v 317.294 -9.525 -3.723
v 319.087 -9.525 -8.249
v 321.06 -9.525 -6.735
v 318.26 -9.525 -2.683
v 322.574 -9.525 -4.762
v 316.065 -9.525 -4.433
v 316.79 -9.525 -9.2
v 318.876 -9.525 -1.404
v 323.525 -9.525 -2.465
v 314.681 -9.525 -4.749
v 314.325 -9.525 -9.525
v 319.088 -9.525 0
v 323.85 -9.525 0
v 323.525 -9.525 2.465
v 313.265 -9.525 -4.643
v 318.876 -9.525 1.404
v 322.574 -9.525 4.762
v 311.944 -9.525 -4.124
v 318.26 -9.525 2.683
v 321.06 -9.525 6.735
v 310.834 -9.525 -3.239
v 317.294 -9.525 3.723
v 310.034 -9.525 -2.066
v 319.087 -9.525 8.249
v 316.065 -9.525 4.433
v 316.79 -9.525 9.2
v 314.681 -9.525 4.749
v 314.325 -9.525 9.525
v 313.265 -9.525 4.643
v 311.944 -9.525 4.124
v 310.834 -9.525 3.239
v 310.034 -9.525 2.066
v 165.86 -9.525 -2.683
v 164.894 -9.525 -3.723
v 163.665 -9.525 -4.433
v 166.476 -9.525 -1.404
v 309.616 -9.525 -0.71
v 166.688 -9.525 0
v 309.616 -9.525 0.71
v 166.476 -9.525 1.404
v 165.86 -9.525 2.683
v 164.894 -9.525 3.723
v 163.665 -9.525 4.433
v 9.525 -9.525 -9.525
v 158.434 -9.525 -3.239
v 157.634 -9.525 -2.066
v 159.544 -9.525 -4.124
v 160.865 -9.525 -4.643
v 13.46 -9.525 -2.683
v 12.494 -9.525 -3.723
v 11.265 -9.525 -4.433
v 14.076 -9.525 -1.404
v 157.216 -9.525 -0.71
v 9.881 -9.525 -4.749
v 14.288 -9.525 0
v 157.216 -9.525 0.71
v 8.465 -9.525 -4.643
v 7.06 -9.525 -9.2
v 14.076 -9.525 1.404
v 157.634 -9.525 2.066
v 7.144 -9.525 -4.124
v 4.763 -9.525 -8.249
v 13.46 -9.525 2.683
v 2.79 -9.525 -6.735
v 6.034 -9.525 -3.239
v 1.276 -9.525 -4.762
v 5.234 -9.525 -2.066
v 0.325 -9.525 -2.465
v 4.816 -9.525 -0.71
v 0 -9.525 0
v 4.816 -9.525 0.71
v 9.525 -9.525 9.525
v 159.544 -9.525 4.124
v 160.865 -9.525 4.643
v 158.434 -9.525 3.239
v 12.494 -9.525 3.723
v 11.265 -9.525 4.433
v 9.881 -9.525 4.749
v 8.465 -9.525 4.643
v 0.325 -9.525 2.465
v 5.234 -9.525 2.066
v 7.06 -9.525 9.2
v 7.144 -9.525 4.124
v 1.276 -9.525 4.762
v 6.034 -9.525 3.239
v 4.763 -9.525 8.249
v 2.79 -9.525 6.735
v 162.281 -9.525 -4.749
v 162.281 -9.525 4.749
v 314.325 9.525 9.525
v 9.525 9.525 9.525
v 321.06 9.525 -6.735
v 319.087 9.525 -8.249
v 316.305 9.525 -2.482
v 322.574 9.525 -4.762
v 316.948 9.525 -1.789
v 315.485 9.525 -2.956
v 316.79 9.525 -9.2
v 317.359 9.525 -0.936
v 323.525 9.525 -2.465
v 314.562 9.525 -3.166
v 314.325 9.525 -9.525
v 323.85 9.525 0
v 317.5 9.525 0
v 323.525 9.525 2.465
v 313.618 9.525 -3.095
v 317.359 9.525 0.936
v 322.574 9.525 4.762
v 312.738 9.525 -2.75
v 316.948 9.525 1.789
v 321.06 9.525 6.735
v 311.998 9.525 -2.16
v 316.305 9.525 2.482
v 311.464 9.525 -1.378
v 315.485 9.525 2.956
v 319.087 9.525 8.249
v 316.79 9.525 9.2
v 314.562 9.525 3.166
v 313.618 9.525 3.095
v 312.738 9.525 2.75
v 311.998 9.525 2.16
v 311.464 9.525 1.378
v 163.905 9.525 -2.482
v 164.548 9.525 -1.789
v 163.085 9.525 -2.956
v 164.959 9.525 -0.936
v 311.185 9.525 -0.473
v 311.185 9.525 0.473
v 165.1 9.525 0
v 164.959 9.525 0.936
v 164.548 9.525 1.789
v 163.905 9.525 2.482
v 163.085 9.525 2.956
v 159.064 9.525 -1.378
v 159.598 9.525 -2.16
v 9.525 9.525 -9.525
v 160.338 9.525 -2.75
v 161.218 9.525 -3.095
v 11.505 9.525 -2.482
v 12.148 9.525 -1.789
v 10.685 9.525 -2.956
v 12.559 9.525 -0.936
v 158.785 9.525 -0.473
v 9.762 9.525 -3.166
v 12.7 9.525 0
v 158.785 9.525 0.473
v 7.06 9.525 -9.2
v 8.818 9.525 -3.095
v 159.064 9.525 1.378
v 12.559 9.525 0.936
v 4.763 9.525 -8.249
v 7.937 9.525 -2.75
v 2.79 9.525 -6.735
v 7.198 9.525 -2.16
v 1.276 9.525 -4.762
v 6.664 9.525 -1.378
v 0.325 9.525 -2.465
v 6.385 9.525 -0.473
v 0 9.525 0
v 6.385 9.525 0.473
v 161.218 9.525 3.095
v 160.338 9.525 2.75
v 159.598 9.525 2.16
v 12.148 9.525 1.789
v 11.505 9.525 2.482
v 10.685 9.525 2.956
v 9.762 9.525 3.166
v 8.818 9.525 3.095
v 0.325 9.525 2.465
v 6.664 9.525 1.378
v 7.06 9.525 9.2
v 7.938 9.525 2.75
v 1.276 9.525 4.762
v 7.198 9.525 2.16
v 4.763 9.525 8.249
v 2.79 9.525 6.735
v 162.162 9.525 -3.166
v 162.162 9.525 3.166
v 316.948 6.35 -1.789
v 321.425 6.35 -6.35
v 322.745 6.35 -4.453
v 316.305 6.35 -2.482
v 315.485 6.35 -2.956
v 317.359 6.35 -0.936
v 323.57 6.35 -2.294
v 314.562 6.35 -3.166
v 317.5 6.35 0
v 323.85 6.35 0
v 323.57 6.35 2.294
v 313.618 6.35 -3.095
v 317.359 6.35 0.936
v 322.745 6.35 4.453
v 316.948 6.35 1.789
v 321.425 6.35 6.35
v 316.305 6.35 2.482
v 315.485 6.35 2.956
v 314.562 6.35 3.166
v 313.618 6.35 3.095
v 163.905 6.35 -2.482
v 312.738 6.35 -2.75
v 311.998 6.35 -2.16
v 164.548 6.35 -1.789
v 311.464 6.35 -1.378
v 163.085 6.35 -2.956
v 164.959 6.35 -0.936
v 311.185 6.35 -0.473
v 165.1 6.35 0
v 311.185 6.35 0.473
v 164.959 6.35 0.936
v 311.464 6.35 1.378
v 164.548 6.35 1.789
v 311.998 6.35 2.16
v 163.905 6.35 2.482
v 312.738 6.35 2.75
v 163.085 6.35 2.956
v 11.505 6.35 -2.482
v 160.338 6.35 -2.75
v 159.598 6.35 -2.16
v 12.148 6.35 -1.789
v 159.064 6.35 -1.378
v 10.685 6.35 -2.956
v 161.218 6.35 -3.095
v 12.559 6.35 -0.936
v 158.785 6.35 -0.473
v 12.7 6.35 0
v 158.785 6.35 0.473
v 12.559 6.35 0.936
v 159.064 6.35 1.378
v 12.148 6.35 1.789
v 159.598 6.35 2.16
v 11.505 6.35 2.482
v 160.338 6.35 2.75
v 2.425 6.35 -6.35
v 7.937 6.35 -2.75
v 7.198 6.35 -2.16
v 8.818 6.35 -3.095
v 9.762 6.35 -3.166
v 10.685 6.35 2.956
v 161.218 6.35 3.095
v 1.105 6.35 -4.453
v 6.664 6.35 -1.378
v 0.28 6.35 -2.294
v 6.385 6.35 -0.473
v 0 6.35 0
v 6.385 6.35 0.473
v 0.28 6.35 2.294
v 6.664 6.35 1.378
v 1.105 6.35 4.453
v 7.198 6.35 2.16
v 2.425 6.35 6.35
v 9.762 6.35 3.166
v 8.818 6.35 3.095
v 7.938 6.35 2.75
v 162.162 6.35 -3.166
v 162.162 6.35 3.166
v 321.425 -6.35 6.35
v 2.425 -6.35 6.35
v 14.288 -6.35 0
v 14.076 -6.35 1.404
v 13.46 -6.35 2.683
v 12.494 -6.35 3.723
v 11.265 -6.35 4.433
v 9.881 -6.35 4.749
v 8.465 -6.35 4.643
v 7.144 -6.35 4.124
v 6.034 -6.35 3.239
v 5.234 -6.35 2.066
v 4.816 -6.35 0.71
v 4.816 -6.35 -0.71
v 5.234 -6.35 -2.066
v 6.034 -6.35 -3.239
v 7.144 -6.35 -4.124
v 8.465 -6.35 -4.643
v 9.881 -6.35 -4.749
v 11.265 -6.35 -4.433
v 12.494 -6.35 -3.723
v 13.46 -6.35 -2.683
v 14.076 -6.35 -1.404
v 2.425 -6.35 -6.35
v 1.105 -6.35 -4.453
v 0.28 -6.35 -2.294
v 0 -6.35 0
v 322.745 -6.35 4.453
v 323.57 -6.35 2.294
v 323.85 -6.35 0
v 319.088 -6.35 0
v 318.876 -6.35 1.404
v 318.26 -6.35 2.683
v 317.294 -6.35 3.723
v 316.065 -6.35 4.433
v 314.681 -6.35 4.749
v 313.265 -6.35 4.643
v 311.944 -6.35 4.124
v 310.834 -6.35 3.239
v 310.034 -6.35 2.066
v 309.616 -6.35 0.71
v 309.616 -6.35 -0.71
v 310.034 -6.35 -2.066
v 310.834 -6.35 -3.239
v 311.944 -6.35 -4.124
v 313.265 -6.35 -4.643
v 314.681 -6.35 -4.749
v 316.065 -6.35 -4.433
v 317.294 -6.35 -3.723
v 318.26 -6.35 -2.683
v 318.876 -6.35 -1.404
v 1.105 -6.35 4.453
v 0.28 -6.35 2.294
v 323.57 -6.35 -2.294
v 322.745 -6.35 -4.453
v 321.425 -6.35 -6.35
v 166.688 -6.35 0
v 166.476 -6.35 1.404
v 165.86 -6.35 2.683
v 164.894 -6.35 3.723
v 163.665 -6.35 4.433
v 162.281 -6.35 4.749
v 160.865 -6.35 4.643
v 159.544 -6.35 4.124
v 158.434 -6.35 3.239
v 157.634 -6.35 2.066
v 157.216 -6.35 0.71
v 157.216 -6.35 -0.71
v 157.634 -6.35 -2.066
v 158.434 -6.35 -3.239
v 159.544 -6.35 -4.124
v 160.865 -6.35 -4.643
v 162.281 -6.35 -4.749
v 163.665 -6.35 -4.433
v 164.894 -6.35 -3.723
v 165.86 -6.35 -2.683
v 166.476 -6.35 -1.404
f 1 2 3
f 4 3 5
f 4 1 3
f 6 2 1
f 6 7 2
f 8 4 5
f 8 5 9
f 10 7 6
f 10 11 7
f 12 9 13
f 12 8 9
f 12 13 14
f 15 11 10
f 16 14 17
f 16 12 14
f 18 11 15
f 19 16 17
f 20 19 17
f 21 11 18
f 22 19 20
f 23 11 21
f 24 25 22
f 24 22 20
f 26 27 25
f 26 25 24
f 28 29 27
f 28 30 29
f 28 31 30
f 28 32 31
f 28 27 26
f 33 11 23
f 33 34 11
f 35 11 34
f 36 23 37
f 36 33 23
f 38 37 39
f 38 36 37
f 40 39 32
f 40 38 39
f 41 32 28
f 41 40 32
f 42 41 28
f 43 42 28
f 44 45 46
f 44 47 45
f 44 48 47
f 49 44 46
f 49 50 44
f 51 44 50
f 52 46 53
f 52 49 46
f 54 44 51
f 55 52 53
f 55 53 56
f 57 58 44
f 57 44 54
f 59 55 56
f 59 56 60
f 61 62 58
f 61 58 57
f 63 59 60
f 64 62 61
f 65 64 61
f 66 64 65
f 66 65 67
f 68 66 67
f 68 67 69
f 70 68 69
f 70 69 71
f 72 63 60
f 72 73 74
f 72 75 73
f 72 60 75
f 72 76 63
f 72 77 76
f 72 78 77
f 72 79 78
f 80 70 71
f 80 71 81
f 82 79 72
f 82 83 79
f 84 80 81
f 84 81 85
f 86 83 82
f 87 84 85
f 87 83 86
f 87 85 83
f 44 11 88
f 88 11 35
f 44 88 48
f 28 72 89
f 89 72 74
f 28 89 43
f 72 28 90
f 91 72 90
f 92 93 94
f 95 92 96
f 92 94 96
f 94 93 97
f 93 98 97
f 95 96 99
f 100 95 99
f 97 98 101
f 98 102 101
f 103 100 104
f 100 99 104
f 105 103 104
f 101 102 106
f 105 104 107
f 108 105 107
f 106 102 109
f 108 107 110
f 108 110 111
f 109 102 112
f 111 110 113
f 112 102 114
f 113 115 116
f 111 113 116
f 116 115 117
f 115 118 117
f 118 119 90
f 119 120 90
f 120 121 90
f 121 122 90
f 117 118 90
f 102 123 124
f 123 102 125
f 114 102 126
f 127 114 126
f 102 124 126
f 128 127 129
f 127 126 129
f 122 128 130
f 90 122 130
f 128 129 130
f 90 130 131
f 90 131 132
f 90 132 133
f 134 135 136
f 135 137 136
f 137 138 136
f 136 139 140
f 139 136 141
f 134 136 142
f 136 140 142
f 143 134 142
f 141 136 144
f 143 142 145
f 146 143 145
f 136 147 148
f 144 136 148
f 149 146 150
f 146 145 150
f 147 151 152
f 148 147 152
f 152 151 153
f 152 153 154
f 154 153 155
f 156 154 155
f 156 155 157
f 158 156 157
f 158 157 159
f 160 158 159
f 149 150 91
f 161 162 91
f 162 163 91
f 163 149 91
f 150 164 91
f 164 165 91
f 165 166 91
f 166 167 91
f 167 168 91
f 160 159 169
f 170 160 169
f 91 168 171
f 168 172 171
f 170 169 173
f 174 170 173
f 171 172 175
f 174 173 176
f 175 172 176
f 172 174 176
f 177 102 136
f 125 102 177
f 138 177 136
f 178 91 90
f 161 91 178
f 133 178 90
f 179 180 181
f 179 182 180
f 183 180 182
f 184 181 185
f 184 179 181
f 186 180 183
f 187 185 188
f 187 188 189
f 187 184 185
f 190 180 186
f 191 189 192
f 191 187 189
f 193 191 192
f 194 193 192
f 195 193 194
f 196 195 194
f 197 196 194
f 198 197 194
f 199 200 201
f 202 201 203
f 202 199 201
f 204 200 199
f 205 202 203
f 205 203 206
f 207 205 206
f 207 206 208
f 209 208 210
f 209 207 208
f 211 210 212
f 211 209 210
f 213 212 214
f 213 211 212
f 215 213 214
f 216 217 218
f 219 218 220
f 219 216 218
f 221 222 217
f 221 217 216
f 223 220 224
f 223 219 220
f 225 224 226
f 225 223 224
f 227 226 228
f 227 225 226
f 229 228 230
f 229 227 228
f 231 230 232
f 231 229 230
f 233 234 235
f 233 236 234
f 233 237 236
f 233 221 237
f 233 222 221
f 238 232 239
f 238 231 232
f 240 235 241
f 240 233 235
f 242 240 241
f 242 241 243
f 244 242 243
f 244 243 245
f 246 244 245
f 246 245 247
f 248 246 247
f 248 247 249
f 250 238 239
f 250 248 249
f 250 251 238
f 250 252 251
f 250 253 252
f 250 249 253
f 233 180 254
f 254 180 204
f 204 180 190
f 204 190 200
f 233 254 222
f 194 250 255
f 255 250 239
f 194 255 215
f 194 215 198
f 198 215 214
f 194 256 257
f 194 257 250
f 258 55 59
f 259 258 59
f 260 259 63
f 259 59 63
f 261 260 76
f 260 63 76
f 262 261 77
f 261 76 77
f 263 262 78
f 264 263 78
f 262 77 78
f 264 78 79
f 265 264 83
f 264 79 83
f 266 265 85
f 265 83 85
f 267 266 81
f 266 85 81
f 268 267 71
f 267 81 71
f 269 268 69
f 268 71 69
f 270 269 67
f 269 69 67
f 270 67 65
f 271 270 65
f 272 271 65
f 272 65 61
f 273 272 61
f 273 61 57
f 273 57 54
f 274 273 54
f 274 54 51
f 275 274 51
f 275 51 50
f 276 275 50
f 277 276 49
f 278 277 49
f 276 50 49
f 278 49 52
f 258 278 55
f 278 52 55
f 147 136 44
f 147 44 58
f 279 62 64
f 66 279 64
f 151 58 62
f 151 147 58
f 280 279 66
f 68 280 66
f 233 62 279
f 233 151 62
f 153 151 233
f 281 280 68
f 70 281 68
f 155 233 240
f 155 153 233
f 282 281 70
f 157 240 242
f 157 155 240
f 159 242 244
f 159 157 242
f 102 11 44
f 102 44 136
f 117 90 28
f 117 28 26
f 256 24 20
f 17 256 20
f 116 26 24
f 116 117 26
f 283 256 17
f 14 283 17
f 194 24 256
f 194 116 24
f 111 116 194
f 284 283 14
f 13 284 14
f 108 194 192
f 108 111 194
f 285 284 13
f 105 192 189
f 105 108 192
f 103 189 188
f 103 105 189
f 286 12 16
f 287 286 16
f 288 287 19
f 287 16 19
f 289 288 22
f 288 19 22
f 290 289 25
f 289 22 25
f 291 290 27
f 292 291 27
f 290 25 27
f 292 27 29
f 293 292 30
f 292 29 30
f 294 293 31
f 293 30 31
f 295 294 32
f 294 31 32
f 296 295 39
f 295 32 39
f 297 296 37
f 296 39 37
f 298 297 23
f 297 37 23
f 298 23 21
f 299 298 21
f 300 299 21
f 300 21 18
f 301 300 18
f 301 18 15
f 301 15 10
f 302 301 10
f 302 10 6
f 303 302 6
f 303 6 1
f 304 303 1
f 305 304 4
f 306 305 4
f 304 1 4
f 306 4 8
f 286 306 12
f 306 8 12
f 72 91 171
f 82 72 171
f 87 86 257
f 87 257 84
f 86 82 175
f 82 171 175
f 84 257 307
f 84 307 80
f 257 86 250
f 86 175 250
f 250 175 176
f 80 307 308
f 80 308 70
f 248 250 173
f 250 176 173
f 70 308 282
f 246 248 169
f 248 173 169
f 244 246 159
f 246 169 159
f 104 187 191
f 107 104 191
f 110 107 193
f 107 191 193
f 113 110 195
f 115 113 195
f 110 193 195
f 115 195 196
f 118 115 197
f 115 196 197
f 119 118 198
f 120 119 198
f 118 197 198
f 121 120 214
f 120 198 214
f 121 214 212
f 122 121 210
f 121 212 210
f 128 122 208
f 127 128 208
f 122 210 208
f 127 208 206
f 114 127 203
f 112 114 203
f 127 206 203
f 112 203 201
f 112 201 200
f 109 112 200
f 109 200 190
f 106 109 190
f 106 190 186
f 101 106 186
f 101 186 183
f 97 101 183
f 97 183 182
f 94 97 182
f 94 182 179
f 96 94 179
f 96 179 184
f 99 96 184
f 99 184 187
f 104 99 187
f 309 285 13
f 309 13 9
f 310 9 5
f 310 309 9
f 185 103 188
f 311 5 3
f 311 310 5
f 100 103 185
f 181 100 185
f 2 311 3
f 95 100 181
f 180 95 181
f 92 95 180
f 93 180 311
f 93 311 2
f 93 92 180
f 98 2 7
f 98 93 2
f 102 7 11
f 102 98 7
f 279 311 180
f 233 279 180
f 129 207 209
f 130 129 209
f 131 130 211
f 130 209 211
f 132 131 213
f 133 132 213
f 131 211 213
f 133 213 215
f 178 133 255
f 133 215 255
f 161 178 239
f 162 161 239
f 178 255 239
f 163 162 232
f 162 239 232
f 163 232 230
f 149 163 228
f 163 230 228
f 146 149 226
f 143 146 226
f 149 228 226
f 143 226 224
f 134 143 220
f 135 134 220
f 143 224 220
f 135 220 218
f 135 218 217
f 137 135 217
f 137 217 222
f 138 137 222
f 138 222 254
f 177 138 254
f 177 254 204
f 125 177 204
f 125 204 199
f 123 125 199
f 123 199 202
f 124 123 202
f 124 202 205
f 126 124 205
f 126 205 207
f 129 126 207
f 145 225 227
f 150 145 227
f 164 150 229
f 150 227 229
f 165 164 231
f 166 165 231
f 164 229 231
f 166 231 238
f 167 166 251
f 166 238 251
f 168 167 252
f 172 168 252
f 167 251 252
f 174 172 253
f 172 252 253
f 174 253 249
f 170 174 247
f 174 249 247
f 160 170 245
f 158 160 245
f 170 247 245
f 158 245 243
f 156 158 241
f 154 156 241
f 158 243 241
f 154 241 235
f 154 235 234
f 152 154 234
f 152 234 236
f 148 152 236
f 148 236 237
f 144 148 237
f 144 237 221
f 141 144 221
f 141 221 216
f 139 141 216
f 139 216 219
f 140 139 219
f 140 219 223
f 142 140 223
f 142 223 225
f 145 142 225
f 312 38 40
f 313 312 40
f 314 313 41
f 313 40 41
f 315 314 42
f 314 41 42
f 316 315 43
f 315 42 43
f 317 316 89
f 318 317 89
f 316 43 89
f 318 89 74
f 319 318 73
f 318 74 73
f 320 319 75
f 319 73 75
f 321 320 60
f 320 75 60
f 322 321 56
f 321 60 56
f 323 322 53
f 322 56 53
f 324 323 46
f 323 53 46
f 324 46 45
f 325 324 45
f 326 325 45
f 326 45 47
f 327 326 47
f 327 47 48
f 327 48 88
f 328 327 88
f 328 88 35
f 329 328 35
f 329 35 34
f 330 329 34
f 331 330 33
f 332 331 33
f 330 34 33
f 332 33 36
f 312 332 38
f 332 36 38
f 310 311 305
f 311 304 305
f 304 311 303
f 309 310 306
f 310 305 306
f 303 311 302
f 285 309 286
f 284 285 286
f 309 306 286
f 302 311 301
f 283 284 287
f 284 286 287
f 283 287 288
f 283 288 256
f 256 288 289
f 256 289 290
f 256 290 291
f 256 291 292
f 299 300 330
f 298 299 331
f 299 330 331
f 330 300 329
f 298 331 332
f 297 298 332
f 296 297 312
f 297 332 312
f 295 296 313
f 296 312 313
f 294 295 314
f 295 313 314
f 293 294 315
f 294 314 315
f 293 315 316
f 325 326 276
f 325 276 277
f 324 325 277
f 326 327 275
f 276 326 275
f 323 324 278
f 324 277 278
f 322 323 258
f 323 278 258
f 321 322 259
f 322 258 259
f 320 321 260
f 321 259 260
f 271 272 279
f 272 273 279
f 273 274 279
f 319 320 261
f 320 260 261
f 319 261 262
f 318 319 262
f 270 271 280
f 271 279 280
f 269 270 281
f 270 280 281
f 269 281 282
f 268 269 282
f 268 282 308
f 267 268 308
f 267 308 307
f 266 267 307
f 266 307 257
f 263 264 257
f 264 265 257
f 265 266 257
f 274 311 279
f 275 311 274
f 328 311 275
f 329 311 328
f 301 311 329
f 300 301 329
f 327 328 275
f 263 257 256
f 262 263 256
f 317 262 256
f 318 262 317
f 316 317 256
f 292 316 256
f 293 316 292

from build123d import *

# Parameters (mm, degrees)
F0_W        = 19.05
F0_H        = 19.05
F0_W_2      = 12.7
F0_H_2      = 12.7
F1_DEPTH    = 323.85
F3_T1_DEPTH = 66.675
F4_T1_DEPTH = 66.675
F2_R        = 3.175
F5_DEPTH    = 19.051
F2_R_2      = 4.7625
F6_DEPTH    = 3.175


# Not quite as in the source:
# - a fillet or chamfer that OpenCascade refuses, or shapes differently, is made with other operations: its cross-section is extruded or revolved along the edge and cut away or added


with BuildPart() as f1:
    # F0 (on Right) → F1 (new body)
    with BuildSketch(Plane.YZ):
        Rectangle(F0_W, F0_H)
        Rectangle(F0_W_2, F0_H_2, mode=Mode.SUBTRACT)
    extrude(amount=F1_DEPTH)

    # F3: fillet of radius 9.525 on 2 edges, made by hand

    # F3_s2 → F3_t1 (cut)
    with BuildSketch(Plane.XZ.offset(-33.3375)):
        with BuildLine():
            ThreePointArc((9.525, 9.525), (2.7898079092, 6.7351920908), (0, 0))
            Line((0, 0), (0, 9.525))
            Line((0, 9.525), (9.525, 9.525))
        make_face()
        with BuildLine():
            ThreePointArc((9.525, -9.525), (2.7898079092, -6.7351920908), (0, 0))
            Line((0, 0), (0, -9.525))
            Line((0, -9.525), (9.525, -9.525))
        make_face()
    extrude(amount=F3_T1_DEPTH, mode=Mode.SUBTRACT)

    # F4: fillet of radius 9.525 on 2 edges, made by hand

    # F4_s2 → F4_t1 (cut)
    with BuildSketch(Plane.XZ.offset(-33.3375)):
        with BuildLine():
            ThreePointArc((314.325, 9.525), (321.0601920908, 6.7351920908), (323.85, 0))
            Line((323.85, 0), (323.85, 9.525))
            Line((323.85, 9.525), (314.325, 9.525))
        make_face()
        with BuildLine():
            ThreePointArc((323.85, 0), (321.0601920908, -6.7351920908), (314.325, -9.525))
            Line((314.325, -9.525), (323.85, -9.525))
            Line((323.85, -9.525), (323.85, 0))
        make_face()
    extrude(amount=F4_T1_DEPTH, mode=Mode.SUBTRACT)

    # F2 (on face) → F5 (cut, through all)
    with BuildSketch(Plane.XZ.offset(9.525)):
        with Locations((314.325, 0)):
            Circle(F2_R)
        with Locations((161.925, 0)):
            Circle(F2_R)
        with Locations((9.525, 0)):
            Circle(F2_R)
    extrude(amount=-F5_DEPTH, mode=Mode.SUBTRACT)

    # F2 (on face) → F6 (cut, through all)
    with BuildSketch(Plane.XZ.offset(9.525)):
        with Locations((9.525, 0)):
            Circle(F2_R_2)
        with Locations((9.525, 0)):
            Circle(F2_R, mode=Mode.SUBTRACT)
        with Locations((161.925, 0)):
            Circle(F2_R_2)
        with Locations((161.925, 0)):
            Circle(F2_R, mode=Mode.SUBTRACT)
        with Locations((314.325, 0)):
            Circle(F2_R_2)
        with Locations((314.325, 0)):
            Circle(F2_R, mode=Mode.SUBTRACT)
    extrude(amount=-F6_DEPTH, mode=Mode.SUBTRACT)


solid = f1.part
